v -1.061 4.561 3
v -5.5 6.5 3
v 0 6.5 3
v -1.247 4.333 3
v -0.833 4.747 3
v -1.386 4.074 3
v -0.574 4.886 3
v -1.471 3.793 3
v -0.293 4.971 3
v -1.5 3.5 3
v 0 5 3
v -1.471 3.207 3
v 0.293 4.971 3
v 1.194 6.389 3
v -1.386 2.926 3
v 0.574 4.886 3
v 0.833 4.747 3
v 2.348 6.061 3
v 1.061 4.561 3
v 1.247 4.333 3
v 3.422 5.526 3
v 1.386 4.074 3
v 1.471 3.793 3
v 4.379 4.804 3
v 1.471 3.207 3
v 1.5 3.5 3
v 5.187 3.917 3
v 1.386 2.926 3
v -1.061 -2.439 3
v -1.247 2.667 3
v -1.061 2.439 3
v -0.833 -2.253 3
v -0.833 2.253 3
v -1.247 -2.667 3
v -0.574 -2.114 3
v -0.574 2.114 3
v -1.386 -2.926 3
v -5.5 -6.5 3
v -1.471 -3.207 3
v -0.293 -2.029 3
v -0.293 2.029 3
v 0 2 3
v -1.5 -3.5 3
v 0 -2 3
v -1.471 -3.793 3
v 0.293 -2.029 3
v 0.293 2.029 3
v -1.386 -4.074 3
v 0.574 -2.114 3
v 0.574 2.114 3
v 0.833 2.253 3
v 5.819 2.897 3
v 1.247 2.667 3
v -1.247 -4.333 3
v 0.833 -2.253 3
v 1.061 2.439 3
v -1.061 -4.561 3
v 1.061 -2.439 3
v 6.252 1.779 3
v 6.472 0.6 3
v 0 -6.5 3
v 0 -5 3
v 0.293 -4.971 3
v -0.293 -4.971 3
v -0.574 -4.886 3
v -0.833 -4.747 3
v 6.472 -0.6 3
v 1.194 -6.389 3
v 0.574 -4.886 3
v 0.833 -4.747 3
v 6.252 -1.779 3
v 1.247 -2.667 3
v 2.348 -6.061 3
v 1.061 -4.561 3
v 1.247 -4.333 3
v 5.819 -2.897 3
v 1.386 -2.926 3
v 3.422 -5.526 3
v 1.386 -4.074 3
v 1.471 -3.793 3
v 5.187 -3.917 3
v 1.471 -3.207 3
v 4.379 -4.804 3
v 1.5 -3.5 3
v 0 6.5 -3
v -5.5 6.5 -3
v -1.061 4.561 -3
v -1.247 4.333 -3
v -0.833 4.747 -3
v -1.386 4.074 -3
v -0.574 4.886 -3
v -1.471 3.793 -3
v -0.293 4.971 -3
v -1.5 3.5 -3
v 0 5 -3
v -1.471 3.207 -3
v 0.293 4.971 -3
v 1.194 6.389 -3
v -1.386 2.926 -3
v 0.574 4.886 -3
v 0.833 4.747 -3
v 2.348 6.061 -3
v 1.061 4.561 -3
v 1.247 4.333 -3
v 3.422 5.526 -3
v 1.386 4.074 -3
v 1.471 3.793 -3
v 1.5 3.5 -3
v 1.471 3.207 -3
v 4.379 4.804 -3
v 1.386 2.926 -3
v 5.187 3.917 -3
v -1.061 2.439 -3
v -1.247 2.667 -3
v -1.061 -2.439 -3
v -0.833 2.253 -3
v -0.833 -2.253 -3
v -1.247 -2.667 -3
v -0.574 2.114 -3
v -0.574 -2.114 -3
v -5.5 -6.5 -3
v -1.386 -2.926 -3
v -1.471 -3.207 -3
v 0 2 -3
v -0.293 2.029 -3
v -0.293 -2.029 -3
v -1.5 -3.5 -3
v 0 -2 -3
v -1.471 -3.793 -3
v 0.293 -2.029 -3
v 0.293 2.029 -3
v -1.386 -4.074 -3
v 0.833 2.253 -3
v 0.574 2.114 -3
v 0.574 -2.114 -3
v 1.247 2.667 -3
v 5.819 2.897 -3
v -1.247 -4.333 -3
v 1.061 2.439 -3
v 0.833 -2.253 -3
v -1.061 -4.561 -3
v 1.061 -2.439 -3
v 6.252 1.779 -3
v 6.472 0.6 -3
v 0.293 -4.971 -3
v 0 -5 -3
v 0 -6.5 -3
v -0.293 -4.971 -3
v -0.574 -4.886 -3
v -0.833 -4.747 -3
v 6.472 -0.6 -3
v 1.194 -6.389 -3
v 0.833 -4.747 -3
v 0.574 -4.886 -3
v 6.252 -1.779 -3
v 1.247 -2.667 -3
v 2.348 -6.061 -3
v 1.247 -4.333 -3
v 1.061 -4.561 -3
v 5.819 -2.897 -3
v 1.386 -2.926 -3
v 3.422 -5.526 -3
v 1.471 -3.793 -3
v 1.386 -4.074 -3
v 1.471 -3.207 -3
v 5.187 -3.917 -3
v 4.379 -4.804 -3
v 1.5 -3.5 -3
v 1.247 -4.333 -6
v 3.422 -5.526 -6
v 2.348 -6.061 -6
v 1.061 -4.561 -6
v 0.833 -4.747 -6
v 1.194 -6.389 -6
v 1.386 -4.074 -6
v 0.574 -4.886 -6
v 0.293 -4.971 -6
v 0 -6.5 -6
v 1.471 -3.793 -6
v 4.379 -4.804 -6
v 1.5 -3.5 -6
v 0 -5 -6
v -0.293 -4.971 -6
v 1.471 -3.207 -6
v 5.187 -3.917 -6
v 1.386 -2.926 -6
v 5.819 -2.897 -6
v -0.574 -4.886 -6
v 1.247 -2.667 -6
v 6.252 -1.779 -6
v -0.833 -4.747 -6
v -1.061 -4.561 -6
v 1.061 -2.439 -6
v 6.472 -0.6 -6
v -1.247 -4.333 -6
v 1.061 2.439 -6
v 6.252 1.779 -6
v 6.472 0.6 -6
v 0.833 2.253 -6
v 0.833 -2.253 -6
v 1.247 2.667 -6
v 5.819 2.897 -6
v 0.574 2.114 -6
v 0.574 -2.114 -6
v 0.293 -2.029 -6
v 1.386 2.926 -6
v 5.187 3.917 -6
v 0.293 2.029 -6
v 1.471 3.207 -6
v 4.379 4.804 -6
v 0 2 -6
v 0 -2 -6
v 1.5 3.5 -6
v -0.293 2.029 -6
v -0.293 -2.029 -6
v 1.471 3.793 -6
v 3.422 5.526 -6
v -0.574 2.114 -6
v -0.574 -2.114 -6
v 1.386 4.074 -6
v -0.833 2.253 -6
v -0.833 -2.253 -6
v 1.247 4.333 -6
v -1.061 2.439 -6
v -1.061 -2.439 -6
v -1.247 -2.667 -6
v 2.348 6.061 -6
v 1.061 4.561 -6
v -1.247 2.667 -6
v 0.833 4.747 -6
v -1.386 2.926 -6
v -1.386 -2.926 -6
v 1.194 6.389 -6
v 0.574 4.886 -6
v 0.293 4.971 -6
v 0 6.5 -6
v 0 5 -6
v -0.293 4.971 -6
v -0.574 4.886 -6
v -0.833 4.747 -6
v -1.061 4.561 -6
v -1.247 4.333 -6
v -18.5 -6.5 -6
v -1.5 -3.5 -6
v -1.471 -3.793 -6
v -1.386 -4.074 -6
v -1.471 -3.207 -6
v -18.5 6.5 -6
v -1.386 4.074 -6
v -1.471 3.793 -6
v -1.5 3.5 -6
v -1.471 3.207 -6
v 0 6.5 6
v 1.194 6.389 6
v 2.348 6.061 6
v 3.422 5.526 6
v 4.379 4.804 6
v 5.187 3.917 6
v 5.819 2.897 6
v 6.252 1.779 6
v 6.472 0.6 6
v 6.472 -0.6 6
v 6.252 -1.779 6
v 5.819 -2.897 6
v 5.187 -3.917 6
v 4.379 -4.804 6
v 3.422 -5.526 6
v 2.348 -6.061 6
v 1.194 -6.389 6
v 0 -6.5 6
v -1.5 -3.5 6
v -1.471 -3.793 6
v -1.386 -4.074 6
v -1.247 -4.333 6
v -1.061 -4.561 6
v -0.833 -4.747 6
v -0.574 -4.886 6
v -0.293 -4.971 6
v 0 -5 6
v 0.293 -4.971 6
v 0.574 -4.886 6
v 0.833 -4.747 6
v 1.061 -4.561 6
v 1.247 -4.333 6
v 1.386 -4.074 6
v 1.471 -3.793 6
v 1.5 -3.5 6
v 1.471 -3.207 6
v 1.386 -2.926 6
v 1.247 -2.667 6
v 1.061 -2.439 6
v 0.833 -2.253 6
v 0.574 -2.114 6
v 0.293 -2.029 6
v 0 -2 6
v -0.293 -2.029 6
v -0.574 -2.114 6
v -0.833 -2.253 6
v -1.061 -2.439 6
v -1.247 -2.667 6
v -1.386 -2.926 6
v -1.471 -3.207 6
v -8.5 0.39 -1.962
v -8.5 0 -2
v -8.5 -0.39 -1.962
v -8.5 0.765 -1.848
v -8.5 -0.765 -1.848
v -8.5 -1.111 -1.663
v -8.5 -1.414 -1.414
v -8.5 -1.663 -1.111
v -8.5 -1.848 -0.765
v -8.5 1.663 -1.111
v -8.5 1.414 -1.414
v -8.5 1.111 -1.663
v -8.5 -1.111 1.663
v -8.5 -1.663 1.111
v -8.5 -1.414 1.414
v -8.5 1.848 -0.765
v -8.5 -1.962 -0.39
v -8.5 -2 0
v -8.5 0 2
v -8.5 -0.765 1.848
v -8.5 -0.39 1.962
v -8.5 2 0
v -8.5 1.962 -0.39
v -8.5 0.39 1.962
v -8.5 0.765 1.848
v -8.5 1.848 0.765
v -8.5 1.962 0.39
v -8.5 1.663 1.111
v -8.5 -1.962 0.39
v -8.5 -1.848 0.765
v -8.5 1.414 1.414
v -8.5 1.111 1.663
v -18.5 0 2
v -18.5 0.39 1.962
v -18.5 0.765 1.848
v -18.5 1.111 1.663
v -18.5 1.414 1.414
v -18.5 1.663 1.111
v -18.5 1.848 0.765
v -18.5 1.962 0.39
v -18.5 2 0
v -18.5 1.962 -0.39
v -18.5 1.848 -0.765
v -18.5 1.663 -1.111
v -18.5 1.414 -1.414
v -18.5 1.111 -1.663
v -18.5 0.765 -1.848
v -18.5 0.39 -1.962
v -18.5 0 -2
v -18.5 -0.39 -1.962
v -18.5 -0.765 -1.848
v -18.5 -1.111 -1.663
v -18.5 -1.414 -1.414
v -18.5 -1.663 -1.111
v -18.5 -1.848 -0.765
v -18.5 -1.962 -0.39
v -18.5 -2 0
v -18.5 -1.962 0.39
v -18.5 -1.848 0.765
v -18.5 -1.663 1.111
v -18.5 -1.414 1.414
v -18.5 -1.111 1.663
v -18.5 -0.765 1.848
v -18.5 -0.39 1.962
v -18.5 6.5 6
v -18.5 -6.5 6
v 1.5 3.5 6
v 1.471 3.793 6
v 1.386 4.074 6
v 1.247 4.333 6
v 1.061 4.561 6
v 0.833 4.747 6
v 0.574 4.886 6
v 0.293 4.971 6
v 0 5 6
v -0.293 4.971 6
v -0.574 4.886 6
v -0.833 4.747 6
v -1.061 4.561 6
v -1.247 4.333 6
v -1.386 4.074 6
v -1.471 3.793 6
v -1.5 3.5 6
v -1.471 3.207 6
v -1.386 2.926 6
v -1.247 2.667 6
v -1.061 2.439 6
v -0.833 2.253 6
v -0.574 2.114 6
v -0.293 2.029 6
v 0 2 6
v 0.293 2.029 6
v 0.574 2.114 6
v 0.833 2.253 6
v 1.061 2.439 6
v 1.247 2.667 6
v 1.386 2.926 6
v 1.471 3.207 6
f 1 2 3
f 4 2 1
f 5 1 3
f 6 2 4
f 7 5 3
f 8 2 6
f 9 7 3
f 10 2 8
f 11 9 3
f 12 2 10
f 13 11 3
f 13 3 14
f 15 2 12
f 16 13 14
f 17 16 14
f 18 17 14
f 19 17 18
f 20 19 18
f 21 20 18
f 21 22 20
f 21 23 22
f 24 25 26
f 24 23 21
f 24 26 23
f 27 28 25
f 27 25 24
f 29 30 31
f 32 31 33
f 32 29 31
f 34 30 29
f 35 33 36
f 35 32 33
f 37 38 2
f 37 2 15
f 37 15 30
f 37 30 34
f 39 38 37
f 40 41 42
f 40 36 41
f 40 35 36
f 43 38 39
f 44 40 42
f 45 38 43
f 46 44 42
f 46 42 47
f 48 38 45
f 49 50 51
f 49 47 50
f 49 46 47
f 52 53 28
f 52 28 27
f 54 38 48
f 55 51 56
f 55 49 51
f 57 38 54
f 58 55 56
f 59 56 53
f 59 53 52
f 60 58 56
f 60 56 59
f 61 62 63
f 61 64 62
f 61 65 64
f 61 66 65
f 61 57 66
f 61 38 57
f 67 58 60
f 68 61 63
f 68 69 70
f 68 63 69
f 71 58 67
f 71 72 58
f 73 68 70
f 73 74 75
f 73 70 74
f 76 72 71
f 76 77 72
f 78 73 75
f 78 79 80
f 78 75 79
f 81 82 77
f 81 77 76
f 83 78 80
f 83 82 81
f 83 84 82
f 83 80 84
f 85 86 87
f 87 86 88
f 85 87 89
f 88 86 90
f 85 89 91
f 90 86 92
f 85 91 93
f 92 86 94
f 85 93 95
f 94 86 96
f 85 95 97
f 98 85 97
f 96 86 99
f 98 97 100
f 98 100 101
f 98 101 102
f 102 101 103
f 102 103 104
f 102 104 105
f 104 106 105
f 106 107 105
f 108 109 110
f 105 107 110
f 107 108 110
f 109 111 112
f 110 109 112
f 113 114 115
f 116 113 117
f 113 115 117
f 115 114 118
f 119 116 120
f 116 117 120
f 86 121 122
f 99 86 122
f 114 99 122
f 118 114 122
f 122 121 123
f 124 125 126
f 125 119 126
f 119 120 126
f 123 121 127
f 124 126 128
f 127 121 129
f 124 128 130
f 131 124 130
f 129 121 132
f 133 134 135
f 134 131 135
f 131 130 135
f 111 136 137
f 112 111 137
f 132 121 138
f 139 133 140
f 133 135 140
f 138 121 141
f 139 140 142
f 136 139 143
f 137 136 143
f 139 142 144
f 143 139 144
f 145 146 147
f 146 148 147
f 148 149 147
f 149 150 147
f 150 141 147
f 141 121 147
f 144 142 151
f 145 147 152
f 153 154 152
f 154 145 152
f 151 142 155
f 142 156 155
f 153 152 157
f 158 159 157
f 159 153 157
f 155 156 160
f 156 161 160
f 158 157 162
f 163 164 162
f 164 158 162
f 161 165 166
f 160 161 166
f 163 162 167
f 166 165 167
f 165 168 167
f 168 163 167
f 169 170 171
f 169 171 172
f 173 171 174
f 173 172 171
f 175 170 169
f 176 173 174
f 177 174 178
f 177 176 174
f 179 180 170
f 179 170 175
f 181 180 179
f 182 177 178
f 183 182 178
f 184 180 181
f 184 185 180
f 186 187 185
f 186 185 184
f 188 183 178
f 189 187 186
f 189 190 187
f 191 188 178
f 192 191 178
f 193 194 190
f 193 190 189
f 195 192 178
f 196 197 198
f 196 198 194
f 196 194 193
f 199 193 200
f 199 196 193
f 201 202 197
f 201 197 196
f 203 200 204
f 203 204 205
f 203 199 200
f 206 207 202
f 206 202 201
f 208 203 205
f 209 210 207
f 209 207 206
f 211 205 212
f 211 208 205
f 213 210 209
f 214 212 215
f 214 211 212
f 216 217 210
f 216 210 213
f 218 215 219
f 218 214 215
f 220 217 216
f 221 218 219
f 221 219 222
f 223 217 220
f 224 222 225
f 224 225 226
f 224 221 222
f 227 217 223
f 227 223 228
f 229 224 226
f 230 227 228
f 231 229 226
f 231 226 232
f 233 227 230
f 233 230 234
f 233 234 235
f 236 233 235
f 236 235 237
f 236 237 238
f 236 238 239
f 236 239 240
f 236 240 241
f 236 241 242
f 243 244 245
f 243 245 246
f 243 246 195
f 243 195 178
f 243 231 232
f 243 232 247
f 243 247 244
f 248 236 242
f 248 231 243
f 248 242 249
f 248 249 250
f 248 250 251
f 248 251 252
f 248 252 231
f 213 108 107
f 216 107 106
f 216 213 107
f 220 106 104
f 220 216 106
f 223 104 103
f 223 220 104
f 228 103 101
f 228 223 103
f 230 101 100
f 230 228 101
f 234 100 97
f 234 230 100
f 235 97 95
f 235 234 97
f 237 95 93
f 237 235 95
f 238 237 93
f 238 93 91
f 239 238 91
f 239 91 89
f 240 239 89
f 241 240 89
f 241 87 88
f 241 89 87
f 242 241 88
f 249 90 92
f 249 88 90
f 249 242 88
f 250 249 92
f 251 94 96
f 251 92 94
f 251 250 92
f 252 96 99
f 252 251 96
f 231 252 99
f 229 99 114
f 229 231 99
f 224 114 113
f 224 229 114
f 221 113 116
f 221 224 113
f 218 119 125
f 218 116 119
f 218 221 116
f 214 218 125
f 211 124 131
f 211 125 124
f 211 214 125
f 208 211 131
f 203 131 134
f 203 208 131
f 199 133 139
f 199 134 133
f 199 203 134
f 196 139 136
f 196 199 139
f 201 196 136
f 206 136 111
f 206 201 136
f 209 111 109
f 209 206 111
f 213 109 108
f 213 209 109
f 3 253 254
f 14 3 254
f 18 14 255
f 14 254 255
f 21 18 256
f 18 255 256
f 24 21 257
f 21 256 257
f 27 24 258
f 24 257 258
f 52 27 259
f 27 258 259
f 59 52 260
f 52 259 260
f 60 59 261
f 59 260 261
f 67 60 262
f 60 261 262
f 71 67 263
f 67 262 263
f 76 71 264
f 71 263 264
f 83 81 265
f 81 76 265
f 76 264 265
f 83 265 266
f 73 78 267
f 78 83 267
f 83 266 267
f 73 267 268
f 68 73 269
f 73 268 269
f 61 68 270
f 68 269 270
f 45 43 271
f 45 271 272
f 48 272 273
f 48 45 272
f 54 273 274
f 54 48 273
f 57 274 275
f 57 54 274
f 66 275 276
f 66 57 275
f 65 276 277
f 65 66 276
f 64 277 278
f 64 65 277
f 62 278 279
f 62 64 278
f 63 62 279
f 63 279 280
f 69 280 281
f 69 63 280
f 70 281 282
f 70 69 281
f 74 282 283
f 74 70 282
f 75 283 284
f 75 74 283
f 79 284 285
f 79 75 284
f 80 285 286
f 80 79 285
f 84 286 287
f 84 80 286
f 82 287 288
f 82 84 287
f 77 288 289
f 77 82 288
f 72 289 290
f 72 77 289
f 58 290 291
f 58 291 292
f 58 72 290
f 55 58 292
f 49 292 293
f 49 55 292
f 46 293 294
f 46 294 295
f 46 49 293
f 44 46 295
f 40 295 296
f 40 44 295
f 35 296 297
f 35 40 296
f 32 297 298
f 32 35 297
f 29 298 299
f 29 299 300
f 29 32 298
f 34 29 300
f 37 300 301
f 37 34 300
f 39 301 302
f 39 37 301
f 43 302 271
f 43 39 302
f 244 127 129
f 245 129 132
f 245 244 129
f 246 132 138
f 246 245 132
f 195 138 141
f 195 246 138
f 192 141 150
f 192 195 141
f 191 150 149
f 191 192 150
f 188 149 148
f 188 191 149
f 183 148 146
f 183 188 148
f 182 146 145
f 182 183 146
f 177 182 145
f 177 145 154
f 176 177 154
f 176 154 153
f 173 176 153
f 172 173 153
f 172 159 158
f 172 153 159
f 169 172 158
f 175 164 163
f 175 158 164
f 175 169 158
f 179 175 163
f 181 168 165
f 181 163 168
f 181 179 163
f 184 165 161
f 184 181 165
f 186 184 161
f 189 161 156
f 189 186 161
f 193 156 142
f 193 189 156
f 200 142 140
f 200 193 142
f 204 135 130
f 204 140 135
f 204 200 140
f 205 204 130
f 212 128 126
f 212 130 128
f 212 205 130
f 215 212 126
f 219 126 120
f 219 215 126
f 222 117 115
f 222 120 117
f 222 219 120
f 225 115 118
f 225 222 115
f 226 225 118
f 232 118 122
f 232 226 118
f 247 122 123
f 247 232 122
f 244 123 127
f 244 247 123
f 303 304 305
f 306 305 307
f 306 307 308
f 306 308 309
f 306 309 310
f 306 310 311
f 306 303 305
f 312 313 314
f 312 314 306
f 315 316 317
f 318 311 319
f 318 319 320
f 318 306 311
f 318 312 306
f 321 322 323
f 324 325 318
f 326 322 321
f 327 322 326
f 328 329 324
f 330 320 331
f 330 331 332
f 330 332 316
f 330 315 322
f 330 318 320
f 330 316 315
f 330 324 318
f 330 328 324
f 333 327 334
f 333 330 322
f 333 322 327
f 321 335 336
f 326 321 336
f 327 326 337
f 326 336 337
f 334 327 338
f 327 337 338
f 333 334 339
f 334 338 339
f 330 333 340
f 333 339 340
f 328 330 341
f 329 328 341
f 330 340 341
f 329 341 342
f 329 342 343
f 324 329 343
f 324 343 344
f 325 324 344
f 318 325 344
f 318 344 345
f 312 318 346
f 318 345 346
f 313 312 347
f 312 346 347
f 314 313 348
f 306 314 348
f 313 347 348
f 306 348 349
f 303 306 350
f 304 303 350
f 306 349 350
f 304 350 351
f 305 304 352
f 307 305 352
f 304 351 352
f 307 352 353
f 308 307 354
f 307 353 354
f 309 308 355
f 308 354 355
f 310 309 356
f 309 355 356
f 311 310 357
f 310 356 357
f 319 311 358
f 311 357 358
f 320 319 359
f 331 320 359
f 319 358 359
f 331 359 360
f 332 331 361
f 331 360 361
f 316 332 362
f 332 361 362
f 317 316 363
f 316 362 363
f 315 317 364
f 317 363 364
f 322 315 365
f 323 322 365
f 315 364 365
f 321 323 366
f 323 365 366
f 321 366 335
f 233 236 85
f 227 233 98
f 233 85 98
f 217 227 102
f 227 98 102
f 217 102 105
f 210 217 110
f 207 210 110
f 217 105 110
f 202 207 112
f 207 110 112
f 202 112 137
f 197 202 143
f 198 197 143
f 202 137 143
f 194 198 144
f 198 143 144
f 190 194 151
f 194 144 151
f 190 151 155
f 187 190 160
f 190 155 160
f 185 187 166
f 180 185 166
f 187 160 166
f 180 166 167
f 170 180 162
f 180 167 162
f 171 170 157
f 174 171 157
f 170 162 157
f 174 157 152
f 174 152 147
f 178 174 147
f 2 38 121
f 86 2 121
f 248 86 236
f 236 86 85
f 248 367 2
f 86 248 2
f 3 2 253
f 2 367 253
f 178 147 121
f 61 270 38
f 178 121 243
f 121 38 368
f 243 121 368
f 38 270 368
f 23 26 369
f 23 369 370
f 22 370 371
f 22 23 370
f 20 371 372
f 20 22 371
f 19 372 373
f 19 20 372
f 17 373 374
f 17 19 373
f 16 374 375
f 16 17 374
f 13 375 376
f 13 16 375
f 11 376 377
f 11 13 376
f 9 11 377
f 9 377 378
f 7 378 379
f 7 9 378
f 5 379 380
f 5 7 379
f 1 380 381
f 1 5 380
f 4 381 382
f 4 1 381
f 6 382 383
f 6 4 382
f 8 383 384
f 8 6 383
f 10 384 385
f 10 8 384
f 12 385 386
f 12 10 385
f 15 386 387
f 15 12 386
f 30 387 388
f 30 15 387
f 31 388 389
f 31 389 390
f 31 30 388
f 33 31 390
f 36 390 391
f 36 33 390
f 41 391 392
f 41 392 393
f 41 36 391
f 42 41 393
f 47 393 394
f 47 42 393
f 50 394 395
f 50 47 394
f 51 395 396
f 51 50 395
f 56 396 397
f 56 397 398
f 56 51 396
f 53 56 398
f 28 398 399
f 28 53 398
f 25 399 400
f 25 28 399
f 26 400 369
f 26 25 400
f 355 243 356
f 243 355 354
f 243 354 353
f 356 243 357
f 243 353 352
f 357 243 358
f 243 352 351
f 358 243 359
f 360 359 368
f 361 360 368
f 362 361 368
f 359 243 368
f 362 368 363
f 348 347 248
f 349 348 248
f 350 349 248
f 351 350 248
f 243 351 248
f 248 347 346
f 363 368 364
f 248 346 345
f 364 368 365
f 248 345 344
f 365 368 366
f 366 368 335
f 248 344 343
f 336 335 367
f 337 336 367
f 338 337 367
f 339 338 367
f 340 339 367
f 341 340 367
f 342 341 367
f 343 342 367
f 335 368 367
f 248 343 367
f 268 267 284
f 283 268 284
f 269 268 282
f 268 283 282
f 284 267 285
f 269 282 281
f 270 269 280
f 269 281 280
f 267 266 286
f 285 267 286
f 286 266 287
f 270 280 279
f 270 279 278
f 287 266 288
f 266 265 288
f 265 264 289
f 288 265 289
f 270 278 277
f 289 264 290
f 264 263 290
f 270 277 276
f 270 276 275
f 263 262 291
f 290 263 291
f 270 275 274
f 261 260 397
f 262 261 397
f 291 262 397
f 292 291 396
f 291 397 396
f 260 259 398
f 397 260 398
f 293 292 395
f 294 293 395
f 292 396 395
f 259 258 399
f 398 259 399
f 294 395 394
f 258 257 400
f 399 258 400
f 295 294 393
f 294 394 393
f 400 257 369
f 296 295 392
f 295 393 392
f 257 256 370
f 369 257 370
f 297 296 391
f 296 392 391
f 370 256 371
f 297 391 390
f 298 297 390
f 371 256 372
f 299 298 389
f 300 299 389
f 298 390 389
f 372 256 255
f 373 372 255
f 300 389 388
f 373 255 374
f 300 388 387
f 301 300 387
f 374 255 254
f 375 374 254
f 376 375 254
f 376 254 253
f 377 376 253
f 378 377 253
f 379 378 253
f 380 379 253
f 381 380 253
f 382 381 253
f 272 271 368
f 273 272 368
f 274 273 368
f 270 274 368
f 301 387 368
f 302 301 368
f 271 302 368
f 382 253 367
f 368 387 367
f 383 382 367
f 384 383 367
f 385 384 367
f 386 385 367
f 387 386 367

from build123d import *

# Parameters (mm, degrees)
SKETCH1_R               = 1.5
BOSS_EXTRUDE1_DEPTH     = 6
CUT_EXTRUDE1_DEPTH      = 21.506096654
CUT_EXTRUDE1_DEPTH_BACK = 21.506096654
SKETCH2_W               = 12
SKETCH2_H               = 6
SKETCH3_R               = 2
CUT_EXTRUDE2_DEPTH      = 10


with BuildPart() as part:
    # Sketch1 → Boss-Extrude1 (new, symmetric)
    with BuildSketch(Plane.XY):
        with BuildLine():
            Line((-18.5, 6.5), (0, 6.5))
            ThreePointArc((0, 6.5), (6.5, 0), (0, -6.5))
            Line((0, -6.5), (-18.5, -6.5))
            Line((-18.5, -6.5), (-18.5, 6.5))
        make_face()
        with Locations((0, 3.5)):
            Circle(SKETCH1_R, mode=Mode.SUBTRACT)
        with Locations(Location((0, -3.5, 0), (0, 0, 180))):
            Circle(SKETCH1_R, mode=Mode.SUBTRACT)
    extrude(amount=BOSS_EXTRUDE1_DEPTH, both=True)

    # Sketch2 → Cut-Extrude1 (cut, two sides: drawn at the far end of the back side and taken through both)
    with BuildSketch(Plane(origin=(0, 0, 0), x_dir=(1, 0, 0), z_dir=(0, 1, 0)).offset(-CUT_EXTRUDE1_DEPTH_BACK)):
        with Locations((0.5, 0)):
            Rectangle(SKETCH2_W, SKETCH2_H)
    extrude(amount=CUT_EXTRUDE1_DEPTH + CUT_EXTRUDE1_DEPTH_BACK, mode=Mode.SUBTRACT)

    # Sketch3 → Cut-Extrude2 (cut)
    with BuildSketch(Plane.ZY.offset(18.5)):
        Circle(SKETCH3_R)
    extrude(amount=-CUT_EXTRUDE2_DEPTH, mode=Mode.SUBTRACT)


solid = part.part
